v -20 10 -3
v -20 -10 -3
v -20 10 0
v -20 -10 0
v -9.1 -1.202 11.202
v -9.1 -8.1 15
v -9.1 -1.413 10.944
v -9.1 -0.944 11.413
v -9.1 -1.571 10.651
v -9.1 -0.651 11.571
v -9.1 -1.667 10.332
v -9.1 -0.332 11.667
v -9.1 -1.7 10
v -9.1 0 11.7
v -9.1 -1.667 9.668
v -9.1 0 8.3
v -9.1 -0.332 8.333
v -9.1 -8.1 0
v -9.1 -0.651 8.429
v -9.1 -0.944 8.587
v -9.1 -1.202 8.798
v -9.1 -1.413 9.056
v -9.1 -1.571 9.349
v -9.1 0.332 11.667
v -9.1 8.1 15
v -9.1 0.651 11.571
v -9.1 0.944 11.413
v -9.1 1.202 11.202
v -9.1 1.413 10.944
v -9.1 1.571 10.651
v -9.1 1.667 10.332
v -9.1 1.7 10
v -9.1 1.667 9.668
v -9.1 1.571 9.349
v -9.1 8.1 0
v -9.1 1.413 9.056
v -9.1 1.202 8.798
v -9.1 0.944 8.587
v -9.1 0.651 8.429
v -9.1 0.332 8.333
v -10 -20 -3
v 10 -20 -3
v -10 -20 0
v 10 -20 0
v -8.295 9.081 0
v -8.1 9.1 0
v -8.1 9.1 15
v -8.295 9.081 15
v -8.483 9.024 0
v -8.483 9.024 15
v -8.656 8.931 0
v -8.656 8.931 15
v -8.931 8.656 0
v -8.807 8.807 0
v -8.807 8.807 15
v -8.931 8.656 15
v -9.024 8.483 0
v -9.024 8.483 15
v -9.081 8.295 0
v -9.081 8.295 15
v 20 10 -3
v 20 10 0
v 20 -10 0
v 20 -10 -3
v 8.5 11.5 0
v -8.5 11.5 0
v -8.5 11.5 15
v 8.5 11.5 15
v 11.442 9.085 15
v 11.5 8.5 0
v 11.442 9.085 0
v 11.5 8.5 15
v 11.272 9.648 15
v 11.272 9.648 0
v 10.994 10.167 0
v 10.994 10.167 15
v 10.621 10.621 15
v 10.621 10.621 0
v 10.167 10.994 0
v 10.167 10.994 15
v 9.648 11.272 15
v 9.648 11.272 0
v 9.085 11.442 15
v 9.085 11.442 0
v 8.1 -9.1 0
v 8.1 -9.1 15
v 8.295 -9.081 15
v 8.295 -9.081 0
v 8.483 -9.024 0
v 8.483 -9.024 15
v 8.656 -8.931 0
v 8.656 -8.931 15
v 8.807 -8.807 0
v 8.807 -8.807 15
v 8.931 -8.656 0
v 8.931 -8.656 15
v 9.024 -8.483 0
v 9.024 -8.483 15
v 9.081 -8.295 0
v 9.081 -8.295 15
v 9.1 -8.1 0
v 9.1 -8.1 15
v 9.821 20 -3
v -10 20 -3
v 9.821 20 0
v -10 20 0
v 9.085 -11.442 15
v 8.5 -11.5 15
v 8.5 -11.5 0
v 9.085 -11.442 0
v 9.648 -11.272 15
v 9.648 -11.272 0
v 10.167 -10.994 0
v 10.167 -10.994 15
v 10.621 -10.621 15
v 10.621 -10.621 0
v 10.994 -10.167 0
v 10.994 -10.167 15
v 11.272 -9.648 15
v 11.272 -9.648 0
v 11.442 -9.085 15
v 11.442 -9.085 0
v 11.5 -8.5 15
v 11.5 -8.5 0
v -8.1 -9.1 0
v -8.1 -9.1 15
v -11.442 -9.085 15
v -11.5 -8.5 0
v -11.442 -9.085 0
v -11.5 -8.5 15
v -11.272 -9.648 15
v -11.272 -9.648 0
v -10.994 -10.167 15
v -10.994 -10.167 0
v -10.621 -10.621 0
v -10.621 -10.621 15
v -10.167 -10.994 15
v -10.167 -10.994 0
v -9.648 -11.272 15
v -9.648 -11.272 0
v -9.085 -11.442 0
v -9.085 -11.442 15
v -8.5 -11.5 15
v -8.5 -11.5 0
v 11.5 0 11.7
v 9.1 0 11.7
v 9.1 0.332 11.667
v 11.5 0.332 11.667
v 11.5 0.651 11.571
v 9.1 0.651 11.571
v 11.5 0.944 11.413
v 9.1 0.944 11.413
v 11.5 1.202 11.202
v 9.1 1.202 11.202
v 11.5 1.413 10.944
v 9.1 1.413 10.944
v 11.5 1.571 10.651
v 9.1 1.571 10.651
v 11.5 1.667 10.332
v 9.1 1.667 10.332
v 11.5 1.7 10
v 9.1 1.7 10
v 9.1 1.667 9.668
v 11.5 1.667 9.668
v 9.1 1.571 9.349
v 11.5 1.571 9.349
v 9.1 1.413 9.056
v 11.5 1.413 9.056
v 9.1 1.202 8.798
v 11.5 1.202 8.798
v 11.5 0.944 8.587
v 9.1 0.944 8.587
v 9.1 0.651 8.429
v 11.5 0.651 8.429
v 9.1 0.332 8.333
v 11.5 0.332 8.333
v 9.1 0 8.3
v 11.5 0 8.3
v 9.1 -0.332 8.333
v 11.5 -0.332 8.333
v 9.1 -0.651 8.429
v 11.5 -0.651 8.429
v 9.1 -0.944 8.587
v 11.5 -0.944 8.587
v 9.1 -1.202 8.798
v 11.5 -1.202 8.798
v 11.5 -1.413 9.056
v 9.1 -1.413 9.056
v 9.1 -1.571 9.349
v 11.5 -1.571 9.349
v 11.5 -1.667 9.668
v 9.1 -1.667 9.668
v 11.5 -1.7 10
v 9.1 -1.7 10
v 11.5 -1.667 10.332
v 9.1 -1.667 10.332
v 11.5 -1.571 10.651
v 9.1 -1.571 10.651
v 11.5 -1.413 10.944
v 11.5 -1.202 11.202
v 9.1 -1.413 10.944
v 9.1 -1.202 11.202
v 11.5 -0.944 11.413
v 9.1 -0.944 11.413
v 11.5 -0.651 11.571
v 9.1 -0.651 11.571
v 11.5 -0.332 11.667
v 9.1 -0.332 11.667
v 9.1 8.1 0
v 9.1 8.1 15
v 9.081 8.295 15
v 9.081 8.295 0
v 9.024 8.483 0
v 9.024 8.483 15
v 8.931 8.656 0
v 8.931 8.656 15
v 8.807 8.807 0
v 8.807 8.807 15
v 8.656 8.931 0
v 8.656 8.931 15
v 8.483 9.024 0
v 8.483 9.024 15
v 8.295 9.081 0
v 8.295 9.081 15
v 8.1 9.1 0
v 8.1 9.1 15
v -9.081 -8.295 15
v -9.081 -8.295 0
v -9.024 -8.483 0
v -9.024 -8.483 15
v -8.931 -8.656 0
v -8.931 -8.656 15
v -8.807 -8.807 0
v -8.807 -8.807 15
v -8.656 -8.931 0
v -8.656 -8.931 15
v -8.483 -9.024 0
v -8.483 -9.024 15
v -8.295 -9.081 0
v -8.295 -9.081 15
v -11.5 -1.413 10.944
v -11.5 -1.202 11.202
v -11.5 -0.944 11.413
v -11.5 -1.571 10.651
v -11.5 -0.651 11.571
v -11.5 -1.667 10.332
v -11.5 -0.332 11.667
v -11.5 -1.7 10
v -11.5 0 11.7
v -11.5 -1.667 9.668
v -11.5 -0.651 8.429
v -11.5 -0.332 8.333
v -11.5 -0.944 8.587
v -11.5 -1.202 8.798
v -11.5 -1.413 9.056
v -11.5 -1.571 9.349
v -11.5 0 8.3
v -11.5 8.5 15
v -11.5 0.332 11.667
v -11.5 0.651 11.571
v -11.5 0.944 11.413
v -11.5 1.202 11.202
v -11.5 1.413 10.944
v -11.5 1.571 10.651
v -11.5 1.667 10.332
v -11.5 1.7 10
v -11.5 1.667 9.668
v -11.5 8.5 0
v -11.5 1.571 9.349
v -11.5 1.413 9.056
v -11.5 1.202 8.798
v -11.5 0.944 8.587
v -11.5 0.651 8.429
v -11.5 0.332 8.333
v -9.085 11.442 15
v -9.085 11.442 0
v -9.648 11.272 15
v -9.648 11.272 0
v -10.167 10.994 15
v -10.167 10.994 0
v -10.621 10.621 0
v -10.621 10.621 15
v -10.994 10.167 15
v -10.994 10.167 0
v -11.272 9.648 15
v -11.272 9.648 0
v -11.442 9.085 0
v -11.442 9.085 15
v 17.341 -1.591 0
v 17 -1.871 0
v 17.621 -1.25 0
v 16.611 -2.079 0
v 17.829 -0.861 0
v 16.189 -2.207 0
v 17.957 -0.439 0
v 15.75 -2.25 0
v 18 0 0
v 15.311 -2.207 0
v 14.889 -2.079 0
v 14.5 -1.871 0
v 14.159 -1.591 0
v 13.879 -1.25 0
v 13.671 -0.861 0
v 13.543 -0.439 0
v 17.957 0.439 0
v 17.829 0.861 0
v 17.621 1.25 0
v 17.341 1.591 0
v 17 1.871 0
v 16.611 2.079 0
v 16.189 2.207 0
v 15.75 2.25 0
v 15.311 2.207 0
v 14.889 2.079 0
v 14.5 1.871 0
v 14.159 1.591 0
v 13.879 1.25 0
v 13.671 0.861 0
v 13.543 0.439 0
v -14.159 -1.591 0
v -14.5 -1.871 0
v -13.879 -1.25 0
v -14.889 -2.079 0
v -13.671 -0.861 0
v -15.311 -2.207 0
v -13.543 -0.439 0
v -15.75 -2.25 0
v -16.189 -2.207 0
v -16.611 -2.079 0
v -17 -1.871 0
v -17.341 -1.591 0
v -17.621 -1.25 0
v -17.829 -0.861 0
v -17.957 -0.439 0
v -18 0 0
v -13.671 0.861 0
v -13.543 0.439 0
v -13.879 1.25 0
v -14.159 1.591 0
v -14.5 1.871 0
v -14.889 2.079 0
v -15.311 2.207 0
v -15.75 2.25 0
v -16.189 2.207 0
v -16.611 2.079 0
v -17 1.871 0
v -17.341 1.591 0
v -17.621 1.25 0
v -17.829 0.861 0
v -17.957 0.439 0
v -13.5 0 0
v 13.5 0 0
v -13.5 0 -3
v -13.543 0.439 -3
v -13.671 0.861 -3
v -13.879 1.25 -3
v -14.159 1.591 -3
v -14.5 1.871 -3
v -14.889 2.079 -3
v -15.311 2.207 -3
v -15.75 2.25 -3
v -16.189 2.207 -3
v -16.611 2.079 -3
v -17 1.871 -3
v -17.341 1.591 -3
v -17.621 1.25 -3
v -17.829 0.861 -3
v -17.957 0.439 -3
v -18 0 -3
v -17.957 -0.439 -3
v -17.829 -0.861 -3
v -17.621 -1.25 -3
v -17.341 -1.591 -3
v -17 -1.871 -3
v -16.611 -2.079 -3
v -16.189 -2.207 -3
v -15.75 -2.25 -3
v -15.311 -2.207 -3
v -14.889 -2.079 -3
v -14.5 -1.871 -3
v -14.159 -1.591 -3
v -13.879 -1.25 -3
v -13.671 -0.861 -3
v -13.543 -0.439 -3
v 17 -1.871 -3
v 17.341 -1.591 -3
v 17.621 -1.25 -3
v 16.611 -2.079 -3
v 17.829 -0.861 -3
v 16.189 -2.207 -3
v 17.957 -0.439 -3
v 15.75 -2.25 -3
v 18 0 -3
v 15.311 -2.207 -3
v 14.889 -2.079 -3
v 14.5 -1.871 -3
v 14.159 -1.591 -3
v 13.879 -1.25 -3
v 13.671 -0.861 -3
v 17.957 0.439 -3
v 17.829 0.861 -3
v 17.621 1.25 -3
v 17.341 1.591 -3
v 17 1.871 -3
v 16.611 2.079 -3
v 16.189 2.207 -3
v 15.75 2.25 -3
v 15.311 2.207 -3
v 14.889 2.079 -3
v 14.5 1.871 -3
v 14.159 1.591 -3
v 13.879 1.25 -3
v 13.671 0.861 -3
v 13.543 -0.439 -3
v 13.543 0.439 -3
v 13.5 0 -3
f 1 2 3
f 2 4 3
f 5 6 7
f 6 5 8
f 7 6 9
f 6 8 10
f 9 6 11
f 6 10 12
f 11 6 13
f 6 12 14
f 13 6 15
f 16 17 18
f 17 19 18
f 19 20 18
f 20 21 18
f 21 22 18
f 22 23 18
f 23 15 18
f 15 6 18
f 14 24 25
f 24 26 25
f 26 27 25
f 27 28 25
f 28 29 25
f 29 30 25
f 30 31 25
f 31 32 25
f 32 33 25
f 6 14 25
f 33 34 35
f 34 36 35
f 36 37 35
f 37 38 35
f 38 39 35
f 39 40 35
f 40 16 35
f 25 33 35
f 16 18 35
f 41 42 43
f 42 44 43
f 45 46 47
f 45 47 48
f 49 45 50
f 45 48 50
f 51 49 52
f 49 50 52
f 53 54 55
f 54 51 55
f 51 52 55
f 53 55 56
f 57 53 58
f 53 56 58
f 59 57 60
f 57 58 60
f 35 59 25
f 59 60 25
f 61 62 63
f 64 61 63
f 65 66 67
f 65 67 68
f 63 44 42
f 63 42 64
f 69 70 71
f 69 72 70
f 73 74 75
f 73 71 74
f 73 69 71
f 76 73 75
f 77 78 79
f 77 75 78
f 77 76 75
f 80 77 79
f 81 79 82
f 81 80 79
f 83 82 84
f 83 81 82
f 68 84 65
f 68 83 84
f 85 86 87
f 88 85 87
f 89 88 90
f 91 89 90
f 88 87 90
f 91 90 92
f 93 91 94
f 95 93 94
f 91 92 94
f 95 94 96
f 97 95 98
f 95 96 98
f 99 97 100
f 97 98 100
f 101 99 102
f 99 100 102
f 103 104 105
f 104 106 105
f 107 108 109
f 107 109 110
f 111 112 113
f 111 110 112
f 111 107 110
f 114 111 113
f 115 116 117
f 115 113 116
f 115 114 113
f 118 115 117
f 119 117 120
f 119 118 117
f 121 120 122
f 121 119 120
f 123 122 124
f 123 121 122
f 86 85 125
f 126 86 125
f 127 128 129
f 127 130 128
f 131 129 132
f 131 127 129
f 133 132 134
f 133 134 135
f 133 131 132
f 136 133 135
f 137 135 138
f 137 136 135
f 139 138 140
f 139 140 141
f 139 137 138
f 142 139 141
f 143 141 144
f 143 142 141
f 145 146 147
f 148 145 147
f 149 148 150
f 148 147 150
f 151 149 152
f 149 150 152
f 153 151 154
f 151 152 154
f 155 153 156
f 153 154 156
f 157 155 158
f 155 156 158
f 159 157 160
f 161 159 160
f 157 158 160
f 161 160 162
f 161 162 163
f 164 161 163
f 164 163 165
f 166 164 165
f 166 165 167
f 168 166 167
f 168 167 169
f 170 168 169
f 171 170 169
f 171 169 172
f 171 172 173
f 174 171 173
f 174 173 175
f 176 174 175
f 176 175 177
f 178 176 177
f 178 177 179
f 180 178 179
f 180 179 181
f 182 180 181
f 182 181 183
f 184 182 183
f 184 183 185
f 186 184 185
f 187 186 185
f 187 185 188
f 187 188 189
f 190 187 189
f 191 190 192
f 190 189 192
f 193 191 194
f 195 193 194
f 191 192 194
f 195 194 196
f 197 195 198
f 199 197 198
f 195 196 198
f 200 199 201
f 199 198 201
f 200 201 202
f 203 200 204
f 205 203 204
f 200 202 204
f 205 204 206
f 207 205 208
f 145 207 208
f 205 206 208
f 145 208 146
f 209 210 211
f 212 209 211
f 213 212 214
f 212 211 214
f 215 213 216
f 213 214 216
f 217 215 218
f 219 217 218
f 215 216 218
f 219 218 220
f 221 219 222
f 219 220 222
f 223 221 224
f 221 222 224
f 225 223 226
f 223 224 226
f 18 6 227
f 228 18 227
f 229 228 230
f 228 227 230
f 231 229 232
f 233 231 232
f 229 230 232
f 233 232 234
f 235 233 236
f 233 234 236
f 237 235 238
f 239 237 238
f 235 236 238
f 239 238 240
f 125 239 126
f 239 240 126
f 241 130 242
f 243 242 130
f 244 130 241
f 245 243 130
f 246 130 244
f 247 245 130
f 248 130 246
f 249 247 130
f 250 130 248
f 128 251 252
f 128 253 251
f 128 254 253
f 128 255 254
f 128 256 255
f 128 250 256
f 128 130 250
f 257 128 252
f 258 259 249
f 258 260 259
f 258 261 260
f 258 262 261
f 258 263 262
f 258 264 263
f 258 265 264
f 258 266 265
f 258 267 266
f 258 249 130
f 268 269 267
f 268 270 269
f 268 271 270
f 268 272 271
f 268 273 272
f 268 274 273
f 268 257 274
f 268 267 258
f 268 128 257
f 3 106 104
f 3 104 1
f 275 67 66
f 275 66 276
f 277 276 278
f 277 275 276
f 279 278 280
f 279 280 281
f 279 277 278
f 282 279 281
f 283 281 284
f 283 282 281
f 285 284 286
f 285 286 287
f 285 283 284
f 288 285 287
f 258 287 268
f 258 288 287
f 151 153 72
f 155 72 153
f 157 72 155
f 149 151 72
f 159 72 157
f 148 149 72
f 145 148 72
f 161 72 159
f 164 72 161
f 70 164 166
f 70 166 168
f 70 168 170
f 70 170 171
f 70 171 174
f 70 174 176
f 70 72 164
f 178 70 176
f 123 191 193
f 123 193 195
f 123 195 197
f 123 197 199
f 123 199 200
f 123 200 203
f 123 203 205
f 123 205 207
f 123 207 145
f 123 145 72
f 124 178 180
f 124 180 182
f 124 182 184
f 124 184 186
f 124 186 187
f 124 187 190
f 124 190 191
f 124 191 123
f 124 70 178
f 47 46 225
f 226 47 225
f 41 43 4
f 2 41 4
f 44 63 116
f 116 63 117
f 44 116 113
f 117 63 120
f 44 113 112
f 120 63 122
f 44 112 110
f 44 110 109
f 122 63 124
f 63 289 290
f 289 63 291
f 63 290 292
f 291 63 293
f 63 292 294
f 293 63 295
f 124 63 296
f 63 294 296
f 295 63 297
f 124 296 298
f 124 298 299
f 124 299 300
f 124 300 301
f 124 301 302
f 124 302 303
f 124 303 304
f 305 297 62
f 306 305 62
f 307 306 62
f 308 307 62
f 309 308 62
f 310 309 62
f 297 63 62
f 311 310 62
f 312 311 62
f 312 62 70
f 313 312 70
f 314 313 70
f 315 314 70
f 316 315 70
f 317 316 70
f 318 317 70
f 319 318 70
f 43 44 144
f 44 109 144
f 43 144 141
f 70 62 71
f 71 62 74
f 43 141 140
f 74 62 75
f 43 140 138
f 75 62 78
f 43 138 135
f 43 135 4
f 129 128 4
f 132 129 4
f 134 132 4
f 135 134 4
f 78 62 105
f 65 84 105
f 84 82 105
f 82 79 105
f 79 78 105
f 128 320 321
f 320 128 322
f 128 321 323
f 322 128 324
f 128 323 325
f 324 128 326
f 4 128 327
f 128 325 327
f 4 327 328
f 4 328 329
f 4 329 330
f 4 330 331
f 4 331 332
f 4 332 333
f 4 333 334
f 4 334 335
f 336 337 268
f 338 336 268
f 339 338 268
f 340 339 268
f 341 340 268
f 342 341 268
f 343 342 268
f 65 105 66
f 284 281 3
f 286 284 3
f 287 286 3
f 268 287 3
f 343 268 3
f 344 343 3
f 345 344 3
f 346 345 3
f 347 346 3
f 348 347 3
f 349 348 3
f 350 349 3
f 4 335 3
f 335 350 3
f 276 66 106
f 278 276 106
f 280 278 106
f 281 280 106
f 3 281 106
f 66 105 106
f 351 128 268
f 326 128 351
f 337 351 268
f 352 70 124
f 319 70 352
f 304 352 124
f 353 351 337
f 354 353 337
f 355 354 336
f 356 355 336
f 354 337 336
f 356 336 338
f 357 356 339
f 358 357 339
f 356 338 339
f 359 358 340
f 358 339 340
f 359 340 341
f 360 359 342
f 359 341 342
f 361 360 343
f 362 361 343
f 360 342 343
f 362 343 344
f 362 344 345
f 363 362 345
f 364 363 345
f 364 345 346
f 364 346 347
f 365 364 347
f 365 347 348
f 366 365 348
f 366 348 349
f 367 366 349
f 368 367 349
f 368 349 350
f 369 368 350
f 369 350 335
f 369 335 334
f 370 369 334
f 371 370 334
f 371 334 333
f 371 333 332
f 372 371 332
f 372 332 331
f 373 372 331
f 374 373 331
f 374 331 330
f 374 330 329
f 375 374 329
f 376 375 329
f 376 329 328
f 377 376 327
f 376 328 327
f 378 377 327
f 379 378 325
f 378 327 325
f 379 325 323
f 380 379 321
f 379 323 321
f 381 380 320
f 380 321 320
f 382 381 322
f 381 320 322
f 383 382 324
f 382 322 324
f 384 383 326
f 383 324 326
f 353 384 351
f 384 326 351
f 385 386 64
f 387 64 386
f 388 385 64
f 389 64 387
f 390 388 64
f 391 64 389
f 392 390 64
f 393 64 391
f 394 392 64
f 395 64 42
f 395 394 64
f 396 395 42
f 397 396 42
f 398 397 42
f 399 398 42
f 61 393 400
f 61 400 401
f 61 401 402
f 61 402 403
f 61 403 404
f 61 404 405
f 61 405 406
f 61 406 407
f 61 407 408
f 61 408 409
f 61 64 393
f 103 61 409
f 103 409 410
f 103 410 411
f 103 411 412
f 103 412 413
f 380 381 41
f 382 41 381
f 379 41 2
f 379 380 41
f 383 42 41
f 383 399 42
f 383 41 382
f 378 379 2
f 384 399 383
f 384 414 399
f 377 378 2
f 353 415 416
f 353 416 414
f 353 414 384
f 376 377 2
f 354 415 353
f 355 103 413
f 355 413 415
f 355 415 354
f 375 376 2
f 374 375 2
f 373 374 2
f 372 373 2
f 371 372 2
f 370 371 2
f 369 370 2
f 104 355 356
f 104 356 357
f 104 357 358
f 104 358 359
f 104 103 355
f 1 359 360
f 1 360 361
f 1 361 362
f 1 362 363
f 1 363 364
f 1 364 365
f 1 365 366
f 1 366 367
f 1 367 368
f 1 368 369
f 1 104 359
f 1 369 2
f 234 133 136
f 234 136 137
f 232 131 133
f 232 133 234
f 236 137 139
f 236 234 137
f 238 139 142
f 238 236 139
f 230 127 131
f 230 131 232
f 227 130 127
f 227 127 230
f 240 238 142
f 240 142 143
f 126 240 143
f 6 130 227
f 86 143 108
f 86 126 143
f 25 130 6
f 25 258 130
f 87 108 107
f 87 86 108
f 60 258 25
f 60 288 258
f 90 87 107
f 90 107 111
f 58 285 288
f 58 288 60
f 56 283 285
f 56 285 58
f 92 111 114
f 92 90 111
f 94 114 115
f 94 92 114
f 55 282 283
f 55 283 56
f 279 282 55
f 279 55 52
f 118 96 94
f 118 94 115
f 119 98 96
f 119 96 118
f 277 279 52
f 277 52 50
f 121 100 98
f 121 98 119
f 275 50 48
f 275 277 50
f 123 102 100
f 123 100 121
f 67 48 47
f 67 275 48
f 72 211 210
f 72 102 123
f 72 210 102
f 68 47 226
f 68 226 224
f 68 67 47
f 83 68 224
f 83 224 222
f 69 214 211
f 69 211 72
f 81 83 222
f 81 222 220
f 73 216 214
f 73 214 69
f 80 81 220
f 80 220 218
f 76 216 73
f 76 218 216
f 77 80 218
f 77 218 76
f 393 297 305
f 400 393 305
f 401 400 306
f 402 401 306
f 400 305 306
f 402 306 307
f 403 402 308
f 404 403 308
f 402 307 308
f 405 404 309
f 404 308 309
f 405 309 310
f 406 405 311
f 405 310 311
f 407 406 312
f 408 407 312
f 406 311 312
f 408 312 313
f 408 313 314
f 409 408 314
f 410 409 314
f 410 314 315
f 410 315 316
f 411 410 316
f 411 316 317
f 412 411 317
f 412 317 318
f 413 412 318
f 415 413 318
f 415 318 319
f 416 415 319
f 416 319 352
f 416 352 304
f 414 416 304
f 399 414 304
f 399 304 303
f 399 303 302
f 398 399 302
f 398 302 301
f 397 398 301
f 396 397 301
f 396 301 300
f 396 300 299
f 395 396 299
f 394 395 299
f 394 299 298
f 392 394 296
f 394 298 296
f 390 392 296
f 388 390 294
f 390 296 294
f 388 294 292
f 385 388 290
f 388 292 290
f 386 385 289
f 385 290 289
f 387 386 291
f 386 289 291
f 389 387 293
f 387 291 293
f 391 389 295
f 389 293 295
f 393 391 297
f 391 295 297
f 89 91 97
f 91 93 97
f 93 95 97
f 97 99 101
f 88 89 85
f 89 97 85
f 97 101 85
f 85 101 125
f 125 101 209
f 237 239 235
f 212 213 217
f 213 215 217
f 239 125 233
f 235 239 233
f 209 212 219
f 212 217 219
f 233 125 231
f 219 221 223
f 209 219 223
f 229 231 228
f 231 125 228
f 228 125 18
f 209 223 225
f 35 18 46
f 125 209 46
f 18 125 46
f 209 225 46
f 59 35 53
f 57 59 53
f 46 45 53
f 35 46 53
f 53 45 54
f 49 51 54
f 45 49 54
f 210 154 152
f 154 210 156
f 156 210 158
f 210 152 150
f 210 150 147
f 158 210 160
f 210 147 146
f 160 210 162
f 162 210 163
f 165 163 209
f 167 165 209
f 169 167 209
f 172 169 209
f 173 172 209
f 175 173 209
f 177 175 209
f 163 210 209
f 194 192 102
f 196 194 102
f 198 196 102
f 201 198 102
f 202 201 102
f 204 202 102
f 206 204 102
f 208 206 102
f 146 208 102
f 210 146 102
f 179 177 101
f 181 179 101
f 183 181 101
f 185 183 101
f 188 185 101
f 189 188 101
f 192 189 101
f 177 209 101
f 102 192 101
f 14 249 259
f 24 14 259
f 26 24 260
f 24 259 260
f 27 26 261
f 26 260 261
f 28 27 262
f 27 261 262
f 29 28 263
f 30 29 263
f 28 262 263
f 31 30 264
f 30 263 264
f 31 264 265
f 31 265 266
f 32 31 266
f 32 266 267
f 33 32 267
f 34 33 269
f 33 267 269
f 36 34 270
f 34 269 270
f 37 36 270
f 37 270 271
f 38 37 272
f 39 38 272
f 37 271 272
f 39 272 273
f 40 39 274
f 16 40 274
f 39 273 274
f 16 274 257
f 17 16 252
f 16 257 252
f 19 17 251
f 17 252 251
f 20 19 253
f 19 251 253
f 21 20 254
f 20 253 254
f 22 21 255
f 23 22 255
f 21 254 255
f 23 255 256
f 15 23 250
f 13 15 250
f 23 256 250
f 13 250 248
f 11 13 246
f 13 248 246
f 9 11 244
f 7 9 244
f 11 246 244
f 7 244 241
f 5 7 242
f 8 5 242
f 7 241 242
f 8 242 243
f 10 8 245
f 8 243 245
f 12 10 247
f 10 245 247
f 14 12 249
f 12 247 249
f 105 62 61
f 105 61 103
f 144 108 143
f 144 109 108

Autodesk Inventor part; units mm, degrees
ref_plane "YZ Plane" through (0, 0, 0) normal (1, 0, 0) x (0, 1, 0)
ref_plane "XZ Plane" through (0, 0, 0) normal (0, 1, 0) x (-1, 0, 0)
ref_plane "XY Plane" through (0, 0, 0) normal (0, 0, 1) x (1, 0, 0)
sketch "スケッチ1" plane through (0, 0, 0) normal (0, 0, 1) x (1, 0, 0)
  line L0 (-9.1, 9.1) -> (9.1, 9.1)
  line L1 (9.1, 9.1) -> (9.1, -9.1)
  line L2 (9.1, -9.1) -> (-9.1, -9.1)
  line L3 (-9.1, -9.1) -> (-9.1, 9.1)
  line L4 (-9.1, 9.1) -> (9.1, -9.1) construction
  line L5 (9.1, 9.1) -> (-9.1, -9.1) construction
  line L6 (-11.5, 11.5) -> (11.5, 11.5)
  line L7 (11.5, 11.5) -> (11.5, -11.5)
  line L8 (11.5, -11.5) -> (-11.5, -11.5)
  line L9 (-11.5, -11.5) -> (-11.5, 11.5)
  line L10 (-11.5, 11.5) -> (11.5, -11.5) construction
  line L11 (11.5, 11.5) -> (-11.5, -11.5) construction
  point P0 (0, 0)
  dimension "d0" = 18.2
  dimension "d1" = 18.2
  dimension "d2" = 23
  dimension "d3" = 23
extrude "押し出し1" add sketch "スケッチ1" along normal blind 15
sketch "スケッチ2" plane through (-11.5, -11.5, 0) normal (-1, 0, 0) x (0, 0, 1)
  circle A0 centre (10, 11.5) radius 1.7
  point P0 (0, 11.5)
  dimension "d6" = 3.4
extrude "押し出し2" cut sketch "スケッチ2" against normal blind 30
sketch "スケッチ3" plane through (0, 0, 0) normal (0, 0, -1) x (-1, 0, 0)
  line L0 (20, 20) -> (-20, 20)
  line L1 (-20, 20) -> (-20, -20)
  line L2 (-20, -20) -> (20, -20)
  line L3 (20, -20) -> (20, 20)
  line L4 (20, 20) -> (-20, -20) construction
  line L5 (-20, 20) -> (20, -20) construction
  point P0 (0, 0)
  dimension "d9" = 40
  dimension "d10" = 40
extrude "押し出し3" add sketch "スケッチ3" along normal blind 3
sketch "スケッチ4" plane through (0, 0, 0) normal (0, 0, 1) x (1, 0, 0)
  point P0 (0, 0)
sketch "スケッチ5" plane through (0, 0, 0) normal (0, 0, 1) x (1, 0, 0)
  circle A0 centre (-15.75, 0) radius 2.25
  circle A1 centre (15.75, 0) radius 2.25
  point P0 (0, 0)
  dimension "d13" = 4.5
  dimension "d14" = 4.5
extrude "押し出し4" cut sketch "スケッチ5" against normal blind 3
sketch "スケッチ6" plane through (0, 0, 0) normal (0, 0, 1) x (1, 0, 0)
  line L0 (-20, -20) -> (-20, 20) projected
  line L1 (-20, 20) -> (20, 20) projected
  line L2 (-20, 10) -> (-20, 20)
  line L3 (-20, 20) -> (-10, 20)
  line L4 (-10, 20) -> (-20, 10)
  line L5 (19.8208, 20) -> (9.8208, 20)
  line L6 (20, 20) -> (20, -20) projected
  line L7 (20, 20) -> (20, 10)
  line L8 (20, 10) -> (9.8208, 20)
  line L9 (-20, -20) -> (-20, -10)
  line L10 (-20, -20) -> (-10, -20)
  line L11 (20, -20) -> (-20, -20) projected
  line L12 (-10, -20) -> (-20, -10)
  line L13 (20, -20) -> (10, -20)
  line L14 (20, -20) -> (20, -10)
  line L15 (10, -20) -> (20, -10)
  point P0 (0, 0)
  dimension "d17" = 10
  dimension "d18" = 10
  dimension "d19" = 10
  dimension "d20" = 10
  dimension "d21" = 10
  dimension "d22" = 10
extrude "押し出し5" cut sketch "スケッチ6" against normal blind 3 contours L0 L12 L10 | L0 L1 L4 | L15 L6 L11 | L1 L6 L8
fillet "フィレット1" radius 3 4 edges at (-11.5, 11.5, 7.5) (11.5, 11.5, 7.5) (11.5, -11.5, 7.5) (-11.5, -11.5, 7.5)
fillet "フィレット2" radius 1 4 edges at (-9.1, 9.1, 7.5) (9.1, 9.1, 7.5) (-9.1, -9.1, 7.5) (9.1, -9.1, 7.5)
properties part number "rod_fixture_vp13"
